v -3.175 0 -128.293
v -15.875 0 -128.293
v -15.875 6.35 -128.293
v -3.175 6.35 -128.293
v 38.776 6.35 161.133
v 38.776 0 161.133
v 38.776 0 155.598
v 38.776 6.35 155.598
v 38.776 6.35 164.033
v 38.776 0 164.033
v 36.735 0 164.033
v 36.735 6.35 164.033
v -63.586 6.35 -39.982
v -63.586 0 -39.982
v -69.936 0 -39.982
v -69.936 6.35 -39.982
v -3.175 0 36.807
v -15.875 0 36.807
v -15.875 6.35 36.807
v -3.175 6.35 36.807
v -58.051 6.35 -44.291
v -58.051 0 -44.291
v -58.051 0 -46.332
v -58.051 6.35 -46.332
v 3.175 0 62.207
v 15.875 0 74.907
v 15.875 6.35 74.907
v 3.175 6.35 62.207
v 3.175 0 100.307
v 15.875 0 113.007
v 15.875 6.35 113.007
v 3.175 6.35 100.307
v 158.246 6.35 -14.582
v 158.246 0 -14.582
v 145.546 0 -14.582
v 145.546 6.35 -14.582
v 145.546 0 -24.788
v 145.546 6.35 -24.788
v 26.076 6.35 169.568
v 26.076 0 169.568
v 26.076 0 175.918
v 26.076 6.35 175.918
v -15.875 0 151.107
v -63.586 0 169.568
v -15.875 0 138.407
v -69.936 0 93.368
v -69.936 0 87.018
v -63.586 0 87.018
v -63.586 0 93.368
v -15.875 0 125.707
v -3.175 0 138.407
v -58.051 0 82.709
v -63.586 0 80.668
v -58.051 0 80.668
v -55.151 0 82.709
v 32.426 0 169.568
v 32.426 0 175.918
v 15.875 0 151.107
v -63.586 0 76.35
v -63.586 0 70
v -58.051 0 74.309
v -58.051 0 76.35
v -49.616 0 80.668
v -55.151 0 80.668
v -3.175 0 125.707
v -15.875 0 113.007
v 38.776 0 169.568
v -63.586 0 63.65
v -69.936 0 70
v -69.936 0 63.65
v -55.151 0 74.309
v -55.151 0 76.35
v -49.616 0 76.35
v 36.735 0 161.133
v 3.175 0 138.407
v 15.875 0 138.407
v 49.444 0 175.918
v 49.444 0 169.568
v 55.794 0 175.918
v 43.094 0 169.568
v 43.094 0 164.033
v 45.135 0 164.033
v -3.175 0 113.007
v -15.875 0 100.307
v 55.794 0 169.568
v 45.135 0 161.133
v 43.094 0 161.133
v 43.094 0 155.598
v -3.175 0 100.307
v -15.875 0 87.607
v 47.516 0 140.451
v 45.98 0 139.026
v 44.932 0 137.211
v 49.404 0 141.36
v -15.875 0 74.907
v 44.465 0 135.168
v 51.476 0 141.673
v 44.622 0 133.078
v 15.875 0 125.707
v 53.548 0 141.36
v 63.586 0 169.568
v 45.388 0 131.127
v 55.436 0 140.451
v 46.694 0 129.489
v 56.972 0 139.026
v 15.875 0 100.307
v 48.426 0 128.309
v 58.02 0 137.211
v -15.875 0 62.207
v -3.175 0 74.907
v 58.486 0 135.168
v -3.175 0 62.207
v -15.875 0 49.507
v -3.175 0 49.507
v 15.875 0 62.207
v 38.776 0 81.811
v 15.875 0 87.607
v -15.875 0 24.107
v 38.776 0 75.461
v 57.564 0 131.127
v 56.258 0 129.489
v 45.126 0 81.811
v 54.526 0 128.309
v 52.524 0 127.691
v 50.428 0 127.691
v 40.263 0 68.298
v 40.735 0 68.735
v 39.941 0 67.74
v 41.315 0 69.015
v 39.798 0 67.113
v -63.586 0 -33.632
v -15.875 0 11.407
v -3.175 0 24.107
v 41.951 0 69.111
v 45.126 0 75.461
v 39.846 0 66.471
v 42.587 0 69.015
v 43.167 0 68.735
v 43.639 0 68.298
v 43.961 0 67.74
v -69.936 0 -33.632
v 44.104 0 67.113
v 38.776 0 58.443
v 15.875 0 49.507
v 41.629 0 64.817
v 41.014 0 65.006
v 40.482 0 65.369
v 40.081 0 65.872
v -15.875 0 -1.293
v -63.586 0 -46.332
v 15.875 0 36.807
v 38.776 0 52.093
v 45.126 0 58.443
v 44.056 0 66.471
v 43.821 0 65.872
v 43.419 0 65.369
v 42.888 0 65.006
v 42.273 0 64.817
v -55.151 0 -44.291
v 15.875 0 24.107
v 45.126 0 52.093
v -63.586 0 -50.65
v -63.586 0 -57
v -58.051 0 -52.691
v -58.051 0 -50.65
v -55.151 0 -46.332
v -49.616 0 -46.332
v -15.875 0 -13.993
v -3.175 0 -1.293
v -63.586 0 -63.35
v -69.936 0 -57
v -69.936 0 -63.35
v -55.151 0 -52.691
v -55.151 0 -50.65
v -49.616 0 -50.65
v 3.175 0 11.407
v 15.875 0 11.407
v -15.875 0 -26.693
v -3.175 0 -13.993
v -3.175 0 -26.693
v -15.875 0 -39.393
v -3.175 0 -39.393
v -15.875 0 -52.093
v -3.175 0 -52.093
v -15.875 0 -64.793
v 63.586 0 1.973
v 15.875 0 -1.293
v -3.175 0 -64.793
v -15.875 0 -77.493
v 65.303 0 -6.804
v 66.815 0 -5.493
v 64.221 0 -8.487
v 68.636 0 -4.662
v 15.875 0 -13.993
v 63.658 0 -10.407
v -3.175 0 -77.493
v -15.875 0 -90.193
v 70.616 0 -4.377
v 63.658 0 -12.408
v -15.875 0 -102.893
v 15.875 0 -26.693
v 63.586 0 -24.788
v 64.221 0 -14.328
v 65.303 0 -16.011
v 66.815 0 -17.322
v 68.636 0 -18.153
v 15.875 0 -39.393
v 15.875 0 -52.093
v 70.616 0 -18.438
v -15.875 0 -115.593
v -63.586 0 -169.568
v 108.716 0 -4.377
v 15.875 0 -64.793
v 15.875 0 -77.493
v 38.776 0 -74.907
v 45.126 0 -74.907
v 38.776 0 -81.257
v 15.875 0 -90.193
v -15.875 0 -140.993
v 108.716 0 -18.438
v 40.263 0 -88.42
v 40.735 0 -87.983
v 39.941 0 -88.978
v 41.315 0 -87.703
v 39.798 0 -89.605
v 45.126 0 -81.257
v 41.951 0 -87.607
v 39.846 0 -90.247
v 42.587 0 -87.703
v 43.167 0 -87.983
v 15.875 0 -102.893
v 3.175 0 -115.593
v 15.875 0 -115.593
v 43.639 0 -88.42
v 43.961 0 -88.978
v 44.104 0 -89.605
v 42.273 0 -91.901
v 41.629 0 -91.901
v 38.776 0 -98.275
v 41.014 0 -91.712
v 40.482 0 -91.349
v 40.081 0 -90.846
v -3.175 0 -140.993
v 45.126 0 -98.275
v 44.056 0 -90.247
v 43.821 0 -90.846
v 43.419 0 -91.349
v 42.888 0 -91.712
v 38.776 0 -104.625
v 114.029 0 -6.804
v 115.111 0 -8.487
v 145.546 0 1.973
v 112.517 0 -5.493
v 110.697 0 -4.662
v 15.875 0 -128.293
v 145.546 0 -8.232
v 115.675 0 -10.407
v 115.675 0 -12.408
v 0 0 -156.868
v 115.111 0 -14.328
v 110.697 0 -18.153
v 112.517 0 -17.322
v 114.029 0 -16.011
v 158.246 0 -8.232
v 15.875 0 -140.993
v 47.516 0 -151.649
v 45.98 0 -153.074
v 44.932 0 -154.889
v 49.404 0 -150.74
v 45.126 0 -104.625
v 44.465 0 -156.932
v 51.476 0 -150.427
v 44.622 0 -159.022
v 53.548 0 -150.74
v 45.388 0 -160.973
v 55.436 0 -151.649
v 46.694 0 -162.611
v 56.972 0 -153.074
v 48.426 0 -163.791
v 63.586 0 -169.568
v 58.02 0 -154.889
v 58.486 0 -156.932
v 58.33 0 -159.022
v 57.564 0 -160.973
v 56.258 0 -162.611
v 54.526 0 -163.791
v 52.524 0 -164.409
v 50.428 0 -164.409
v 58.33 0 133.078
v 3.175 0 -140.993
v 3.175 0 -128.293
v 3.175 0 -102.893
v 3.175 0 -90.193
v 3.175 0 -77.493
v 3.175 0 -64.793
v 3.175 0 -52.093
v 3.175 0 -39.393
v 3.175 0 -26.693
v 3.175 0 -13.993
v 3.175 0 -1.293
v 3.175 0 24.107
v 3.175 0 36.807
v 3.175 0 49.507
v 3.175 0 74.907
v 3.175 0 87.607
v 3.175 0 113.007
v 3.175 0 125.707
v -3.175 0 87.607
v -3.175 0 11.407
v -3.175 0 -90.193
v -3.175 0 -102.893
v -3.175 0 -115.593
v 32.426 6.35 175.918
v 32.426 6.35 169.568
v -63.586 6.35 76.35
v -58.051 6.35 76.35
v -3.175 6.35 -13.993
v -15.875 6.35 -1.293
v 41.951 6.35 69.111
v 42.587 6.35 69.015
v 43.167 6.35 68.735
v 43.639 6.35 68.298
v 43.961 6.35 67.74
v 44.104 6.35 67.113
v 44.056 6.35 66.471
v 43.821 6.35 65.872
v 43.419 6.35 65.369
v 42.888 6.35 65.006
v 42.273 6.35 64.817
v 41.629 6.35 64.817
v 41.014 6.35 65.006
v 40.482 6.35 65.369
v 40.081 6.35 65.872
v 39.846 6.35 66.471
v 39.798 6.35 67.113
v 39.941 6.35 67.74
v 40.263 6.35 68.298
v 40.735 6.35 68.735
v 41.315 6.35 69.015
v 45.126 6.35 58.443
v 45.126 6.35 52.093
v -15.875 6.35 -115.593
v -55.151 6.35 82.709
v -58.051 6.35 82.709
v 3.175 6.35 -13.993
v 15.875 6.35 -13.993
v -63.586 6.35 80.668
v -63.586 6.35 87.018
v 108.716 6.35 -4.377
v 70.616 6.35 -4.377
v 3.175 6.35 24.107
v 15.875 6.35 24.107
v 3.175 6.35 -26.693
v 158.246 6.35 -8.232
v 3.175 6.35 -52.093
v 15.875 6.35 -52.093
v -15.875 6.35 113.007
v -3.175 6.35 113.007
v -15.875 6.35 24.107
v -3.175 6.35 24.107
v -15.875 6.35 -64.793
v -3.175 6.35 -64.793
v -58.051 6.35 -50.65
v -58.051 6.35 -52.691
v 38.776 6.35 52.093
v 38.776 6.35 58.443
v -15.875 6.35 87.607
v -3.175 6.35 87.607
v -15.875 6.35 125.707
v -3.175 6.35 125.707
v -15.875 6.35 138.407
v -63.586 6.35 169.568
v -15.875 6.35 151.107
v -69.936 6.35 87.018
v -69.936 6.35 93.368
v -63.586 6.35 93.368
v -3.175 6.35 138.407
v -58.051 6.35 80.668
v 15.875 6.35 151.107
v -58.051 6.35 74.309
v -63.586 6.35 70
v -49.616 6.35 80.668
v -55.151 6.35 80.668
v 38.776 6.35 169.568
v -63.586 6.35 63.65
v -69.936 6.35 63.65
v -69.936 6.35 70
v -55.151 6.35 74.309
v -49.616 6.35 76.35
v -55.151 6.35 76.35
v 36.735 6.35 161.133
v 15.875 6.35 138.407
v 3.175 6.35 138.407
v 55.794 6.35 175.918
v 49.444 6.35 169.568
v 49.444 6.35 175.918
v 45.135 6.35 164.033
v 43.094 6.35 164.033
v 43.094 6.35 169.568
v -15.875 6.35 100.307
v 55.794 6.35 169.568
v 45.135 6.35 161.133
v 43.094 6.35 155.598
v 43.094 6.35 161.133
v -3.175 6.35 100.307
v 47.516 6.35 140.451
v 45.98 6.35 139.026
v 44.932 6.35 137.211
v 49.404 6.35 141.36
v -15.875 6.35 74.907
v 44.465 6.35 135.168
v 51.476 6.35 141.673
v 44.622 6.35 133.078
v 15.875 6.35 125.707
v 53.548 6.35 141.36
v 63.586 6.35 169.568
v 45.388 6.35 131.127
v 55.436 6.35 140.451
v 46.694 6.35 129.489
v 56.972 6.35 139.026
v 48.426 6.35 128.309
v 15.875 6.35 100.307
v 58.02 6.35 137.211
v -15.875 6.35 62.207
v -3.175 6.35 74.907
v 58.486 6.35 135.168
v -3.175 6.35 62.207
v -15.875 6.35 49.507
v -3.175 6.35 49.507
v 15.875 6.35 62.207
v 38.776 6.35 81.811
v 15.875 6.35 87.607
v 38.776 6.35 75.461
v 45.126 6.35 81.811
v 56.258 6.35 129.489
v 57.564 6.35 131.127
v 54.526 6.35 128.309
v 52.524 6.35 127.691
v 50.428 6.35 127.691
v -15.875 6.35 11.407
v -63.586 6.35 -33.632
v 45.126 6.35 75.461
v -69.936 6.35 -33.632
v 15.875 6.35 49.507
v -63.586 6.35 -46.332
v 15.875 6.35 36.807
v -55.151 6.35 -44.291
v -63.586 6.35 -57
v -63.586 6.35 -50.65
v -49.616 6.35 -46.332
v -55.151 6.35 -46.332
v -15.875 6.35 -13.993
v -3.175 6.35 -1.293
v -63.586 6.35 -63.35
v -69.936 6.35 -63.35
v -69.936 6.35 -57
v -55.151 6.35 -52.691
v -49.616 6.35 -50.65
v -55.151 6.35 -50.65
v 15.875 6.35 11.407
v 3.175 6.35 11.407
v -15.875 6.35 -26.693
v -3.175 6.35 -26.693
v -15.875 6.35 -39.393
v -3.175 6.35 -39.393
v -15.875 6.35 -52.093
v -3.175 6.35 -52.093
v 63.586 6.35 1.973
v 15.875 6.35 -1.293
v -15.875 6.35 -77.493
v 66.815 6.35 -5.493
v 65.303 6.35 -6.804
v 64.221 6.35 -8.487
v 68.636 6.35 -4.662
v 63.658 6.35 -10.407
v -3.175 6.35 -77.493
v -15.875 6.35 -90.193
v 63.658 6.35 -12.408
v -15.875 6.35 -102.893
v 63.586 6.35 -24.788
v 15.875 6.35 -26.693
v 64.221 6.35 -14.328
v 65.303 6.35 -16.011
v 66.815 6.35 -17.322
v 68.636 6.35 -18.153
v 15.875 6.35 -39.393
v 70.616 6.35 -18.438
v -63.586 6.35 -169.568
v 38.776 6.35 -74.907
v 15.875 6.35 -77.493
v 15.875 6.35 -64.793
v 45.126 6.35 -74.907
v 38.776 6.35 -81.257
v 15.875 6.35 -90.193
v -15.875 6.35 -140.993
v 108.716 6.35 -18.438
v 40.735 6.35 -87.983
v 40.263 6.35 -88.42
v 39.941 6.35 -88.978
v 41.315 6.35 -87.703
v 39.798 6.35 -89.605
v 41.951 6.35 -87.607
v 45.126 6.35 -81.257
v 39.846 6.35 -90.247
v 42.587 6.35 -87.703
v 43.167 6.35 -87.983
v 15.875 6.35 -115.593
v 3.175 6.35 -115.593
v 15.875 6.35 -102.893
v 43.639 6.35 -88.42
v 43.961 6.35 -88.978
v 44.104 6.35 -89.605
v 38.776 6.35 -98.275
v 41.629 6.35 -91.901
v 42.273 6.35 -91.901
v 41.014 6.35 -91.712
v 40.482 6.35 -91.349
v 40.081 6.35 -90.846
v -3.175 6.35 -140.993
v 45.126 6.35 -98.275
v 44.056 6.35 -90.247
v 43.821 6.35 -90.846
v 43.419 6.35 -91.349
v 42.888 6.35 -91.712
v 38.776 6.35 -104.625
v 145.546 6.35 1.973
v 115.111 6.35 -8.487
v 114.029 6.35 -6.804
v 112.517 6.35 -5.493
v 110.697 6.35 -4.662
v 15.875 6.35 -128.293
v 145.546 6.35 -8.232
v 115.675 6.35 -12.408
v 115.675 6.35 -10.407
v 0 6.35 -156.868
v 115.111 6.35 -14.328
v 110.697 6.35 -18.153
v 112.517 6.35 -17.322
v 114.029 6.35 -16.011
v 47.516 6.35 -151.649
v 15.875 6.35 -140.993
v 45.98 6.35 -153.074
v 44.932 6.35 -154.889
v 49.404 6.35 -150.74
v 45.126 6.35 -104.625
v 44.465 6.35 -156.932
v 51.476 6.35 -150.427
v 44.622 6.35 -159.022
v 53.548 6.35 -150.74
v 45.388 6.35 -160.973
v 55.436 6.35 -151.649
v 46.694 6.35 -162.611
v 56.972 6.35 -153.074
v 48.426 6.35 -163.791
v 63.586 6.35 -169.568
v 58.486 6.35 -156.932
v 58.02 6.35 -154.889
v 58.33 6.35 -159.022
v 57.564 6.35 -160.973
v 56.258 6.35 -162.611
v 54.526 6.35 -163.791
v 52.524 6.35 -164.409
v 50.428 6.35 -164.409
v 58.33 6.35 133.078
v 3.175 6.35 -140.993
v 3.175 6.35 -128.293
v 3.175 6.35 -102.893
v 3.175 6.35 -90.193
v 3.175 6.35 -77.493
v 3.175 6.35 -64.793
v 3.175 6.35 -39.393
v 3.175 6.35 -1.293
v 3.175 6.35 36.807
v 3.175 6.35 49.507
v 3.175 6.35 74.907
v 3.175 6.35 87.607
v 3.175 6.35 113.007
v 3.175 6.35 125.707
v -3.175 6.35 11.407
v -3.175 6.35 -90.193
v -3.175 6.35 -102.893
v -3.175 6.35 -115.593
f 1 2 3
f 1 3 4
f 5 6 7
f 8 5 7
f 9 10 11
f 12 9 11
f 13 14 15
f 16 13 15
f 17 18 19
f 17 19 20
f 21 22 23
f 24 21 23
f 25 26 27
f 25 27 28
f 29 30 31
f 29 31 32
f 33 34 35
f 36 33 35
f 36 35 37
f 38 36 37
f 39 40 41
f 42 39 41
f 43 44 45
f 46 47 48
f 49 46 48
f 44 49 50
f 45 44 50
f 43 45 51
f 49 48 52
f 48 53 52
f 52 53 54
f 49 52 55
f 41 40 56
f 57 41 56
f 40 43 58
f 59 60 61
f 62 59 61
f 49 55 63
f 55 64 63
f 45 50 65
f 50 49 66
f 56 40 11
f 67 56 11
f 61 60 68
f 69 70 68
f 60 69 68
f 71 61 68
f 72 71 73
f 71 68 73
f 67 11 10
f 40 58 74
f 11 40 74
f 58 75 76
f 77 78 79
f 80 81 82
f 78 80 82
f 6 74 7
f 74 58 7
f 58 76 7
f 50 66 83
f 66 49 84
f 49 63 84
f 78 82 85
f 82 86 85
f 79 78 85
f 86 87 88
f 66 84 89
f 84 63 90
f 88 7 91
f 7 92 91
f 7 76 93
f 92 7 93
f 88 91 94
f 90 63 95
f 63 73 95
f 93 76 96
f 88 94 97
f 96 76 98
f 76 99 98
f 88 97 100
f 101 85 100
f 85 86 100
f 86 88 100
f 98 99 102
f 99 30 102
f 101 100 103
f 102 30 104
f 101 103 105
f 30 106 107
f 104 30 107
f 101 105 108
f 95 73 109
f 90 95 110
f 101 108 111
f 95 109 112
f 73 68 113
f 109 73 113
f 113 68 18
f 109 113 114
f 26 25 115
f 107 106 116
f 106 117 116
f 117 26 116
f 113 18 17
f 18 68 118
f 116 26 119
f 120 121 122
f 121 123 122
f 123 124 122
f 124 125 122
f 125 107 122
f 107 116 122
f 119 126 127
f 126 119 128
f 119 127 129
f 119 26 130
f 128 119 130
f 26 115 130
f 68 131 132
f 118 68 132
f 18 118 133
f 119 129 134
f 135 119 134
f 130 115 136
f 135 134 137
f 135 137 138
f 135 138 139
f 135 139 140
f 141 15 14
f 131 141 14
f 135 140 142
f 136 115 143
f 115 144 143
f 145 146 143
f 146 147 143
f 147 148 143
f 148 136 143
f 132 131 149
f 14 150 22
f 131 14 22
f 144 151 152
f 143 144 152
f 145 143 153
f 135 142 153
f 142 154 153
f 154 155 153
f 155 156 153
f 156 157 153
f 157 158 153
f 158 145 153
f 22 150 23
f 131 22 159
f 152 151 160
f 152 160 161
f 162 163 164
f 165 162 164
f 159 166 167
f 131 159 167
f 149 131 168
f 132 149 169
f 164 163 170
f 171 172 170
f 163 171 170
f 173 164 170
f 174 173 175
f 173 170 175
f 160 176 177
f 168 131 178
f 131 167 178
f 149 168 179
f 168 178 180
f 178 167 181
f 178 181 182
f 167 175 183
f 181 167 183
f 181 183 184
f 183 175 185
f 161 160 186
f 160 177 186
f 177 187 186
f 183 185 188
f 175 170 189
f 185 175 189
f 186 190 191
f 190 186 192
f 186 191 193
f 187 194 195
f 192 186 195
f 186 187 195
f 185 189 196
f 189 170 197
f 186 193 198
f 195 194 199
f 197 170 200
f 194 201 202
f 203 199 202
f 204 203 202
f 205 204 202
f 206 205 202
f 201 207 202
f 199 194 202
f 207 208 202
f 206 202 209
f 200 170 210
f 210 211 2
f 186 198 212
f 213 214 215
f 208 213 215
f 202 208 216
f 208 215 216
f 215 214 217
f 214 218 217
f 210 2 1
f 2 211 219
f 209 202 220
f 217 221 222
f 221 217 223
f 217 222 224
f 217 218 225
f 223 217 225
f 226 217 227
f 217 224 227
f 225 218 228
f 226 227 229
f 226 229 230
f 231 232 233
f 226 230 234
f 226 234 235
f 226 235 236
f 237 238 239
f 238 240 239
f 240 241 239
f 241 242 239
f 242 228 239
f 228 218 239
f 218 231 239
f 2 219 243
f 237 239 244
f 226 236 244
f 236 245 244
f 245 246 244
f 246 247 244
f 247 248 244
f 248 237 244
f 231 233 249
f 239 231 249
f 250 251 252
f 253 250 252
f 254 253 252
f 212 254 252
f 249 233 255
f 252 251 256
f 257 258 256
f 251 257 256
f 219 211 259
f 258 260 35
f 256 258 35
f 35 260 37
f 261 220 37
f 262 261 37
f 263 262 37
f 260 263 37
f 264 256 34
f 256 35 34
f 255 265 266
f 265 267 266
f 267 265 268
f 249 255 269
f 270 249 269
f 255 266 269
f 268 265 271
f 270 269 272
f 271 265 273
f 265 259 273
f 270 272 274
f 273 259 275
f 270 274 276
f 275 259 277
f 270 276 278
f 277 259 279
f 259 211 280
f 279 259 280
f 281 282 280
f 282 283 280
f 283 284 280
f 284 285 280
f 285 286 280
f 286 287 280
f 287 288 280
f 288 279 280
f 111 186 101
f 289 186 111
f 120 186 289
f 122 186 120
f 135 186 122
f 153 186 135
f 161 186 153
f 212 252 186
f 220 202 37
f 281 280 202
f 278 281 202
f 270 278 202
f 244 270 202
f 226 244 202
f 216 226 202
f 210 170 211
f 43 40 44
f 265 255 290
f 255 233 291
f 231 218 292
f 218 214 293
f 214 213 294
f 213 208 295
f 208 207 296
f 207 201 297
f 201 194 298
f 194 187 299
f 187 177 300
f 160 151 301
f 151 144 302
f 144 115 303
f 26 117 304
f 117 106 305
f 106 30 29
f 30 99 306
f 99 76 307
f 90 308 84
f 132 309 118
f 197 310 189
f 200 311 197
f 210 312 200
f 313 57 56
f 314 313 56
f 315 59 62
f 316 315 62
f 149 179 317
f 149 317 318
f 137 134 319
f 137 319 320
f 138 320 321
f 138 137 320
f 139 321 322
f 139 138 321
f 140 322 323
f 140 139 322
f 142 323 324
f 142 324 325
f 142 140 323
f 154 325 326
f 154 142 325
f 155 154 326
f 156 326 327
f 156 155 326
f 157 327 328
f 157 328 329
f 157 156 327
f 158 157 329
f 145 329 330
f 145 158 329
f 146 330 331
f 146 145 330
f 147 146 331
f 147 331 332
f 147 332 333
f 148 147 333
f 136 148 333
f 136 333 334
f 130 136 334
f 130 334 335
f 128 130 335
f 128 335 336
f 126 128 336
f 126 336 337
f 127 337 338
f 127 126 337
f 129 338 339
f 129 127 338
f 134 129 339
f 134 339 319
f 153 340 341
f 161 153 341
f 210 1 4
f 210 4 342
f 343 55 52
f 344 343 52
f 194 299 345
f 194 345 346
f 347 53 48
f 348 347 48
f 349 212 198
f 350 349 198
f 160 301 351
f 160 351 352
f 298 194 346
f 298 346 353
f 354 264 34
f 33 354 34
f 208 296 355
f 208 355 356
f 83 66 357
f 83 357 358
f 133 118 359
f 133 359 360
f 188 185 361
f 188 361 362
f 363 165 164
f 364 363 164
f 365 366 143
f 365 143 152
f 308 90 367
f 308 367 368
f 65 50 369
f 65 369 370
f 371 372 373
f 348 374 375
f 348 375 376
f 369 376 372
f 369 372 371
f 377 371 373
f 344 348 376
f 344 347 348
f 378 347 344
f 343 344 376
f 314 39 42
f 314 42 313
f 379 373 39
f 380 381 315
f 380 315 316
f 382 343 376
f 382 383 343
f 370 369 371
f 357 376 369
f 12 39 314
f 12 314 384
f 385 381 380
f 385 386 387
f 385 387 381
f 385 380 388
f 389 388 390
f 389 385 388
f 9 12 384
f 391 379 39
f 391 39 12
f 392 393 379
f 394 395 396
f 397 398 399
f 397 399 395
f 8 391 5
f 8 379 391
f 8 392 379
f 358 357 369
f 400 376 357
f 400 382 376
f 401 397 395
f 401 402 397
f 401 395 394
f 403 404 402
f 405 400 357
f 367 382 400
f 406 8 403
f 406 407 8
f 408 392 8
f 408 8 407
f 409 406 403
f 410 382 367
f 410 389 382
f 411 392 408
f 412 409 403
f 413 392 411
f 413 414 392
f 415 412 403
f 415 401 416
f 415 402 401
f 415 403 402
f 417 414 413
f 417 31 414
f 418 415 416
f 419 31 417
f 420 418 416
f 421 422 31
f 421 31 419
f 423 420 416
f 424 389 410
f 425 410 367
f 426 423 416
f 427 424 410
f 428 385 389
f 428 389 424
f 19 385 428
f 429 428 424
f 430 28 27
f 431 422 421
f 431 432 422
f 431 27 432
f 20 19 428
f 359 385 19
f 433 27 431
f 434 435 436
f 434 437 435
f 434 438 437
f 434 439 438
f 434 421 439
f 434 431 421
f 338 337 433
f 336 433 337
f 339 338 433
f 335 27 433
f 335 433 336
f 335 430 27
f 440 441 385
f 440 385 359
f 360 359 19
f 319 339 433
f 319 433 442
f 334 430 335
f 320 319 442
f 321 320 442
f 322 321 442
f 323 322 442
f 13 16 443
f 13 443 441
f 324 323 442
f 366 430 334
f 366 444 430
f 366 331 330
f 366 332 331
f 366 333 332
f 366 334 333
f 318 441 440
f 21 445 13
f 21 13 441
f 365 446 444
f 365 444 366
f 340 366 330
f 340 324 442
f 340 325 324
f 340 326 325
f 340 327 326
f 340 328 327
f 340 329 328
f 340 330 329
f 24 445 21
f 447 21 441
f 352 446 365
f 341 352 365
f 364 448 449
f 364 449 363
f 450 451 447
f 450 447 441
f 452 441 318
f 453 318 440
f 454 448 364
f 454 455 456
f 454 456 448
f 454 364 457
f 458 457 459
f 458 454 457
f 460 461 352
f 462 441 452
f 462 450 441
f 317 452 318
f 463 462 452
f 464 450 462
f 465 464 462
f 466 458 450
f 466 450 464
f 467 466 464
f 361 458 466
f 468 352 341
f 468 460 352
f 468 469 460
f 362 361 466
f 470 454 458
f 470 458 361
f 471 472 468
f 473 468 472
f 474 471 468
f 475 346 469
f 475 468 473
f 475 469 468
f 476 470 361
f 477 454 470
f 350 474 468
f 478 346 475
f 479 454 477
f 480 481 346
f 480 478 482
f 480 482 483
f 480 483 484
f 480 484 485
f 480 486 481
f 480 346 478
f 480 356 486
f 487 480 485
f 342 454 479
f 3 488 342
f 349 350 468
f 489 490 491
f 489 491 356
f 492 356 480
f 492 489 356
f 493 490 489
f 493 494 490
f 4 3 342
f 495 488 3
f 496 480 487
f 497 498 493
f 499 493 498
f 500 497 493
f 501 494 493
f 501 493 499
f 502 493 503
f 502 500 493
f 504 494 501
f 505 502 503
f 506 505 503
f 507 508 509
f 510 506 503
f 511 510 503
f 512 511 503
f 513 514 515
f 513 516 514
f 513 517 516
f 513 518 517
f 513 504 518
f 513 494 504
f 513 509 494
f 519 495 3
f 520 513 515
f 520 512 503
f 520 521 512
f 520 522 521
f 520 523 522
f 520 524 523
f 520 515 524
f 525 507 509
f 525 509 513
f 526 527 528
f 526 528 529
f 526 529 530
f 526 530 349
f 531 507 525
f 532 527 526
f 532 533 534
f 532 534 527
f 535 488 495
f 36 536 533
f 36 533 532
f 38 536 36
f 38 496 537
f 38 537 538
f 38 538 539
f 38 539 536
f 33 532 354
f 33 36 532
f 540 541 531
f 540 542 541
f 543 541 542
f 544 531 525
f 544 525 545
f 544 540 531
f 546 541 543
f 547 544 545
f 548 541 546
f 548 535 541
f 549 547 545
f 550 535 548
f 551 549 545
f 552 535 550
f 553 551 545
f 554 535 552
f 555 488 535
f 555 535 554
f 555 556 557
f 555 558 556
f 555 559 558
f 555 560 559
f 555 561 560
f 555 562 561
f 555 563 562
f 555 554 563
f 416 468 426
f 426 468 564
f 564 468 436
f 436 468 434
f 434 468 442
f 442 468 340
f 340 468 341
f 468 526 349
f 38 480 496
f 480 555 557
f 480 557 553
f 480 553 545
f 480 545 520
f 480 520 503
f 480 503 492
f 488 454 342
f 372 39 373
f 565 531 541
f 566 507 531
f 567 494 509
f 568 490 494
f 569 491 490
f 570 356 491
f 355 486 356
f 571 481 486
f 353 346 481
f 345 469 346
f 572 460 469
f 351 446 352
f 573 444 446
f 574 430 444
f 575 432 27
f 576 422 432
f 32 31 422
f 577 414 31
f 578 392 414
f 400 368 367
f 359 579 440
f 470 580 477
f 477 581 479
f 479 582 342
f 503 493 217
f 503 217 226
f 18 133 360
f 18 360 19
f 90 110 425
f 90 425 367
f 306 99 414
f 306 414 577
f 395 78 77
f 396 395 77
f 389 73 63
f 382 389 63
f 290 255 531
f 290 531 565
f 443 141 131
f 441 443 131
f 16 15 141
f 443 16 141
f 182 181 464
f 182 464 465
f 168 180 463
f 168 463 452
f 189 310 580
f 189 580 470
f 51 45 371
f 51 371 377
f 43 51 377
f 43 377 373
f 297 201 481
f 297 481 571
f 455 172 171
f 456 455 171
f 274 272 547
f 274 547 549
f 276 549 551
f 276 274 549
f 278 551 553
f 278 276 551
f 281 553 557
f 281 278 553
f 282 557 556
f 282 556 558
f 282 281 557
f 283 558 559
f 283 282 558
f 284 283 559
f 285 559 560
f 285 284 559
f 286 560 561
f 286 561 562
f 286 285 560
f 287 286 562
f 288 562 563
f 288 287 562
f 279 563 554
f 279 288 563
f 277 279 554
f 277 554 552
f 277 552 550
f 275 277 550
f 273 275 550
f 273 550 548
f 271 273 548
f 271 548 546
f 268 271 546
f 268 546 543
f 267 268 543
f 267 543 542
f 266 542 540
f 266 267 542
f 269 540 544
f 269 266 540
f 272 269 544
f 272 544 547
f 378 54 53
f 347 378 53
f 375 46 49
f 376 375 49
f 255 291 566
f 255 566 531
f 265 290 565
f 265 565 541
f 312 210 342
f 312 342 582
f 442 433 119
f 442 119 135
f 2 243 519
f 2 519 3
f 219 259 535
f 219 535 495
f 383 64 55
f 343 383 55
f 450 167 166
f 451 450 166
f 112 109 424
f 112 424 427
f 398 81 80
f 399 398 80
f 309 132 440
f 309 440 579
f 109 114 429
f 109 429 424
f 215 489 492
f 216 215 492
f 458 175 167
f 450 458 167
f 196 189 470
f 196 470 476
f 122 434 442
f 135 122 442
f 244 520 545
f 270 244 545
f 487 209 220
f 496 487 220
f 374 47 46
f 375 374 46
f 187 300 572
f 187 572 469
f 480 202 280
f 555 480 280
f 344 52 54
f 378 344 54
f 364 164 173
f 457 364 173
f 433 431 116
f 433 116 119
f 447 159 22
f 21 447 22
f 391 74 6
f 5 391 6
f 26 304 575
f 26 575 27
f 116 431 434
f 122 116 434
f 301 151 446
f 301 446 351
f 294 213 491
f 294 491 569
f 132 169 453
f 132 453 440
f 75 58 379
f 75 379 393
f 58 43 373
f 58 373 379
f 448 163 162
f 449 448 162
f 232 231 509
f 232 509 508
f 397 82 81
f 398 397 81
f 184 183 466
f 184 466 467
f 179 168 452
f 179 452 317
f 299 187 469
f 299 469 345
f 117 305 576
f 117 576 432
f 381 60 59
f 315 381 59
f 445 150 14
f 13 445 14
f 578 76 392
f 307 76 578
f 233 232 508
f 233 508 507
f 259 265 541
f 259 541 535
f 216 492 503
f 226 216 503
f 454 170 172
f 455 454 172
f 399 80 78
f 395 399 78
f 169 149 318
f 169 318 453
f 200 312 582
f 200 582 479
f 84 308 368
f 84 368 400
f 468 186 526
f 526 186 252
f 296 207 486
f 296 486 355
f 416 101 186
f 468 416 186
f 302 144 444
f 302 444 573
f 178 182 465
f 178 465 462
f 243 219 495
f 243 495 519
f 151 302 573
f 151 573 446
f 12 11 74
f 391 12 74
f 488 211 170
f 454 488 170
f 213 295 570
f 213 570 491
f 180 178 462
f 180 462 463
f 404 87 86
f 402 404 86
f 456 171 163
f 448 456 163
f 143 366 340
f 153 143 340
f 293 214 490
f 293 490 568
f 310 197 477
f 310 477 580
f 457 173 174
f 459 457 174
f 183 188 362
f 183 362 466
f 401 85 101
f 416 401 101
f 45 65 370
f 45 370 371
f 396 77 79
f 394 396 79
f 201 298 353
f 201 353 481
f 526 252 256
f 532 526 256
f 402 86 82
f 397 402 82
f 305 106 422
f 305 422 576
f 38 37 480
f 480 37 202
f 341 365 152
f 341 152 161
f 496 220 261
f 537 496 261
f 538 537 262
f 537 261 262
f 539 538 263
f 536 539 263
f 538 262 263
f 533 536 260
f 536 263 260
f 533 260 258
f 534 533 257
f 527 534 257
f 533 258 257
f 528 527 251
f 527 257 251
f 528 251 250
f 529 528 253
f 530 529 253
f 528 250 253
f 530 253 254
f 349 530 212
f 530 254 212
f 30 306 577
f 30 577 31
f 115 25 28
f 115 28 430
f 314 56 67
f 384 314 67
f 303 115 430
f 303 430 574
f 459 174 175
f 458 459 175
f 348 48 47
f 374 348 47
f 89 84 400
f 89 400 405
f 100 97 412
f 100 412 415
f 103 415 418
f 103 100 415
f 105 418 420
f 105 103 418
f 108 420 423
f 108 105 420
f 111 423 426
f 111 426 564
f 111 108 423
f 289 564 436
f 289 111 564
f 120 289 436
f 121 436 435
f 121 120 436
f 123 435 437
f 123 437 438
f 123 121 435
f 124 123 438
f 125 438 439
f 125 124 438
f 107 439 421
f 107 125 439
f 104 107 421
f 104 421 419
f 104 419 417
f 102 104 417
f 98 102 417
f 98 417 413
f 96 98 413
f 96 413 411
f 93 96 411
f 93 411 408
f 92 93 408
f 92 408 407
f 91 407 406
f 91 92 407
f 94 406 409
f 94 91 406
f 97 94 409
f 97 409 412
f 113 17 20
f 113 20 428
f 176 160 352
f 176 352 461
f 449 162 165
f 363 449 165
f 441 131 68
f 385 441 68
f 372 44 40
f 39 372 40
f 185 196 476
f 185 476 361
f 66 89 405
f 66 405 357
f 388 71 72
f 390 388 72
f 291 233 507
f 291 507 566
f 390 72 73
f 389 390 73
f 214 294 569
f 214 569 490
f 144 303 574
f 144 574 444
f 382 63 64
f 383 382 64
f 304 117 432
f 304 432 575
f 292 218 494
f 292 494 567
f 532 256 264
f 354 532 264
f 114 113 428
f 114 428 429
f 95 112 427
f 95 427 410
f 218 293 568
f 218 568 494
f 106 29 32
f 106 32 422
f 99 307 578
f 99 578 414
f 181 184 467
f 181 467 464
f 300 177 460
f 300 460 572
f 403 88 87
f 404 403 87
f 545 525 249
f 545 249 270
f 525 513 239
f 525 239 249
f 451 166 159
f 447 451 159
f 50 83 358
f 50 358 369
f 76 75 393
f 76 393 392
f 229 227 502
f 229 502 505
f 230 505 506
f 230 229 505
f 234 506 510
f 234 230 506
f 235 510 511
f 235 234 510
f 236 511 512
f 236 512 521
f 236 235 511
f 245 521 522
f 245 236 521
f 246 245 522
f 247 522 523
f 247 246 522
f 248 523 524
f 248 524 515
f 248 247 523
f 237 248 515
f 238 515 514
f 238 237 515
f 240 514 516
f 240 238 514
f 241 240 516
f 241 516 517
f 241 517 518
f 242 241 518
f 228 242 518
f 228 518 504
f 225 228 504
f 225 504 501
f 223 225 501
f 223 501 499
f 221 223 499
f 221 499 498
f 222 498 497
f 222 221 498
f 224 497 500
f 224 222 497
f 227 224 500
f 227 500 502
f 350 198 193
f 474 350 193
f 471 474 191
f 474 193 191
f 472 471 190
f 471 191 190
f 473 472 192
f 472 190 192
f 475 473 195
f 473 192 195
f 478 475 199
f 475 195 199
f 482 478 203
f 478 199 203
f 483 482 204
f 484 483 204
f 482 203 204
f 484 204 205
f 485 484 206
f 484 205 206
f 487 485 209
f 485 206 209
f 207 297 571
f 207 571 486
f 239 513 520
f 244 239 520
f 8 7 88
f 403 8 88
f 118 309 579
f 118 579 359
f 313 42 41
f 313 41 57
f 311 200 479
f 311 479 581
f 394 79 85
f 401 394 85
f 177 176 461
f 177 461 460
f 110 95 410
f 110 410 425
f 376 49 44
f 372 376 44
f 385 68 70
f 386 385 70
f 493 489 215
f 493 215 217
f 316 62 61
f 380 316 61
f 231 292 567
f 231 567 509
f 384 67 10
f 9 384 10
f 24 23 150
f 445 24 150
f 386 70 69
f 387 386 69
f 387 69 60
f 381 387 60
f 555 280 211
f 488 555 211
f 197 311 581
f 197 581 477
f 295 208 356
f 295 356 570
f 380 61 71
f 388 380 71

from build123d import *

# Parameters (mm, degrees)
AXLE_SUPPORT_PLATE_R   = 7.030128061
AXLE_SUPPORT_PLATE_R_2 = 2.159
AXLE_SUPPORT_PLATE_W   = 6.35
AXLE_SUPPORT_PLATE_H   = 6.35
BOSS_EXTRUDE1_DEPTH    = 6.35


with BuildPart() as part:
    # Axle Support Plate → Boss-Extrude1 (new body)
    with BuildSketch(Plane(origin=(0, 0, 0), x_dir=(1, 0, 0), z_dir=(0, 1, 0))):
        Polygon((63.58606403, -169.56756403), (63.58606403, -1.972692091), (145.546192091, -1.972692091), (145.546192091, 8.23243597), (158.246192091, 8.23243597), (158.246192091, 14.58243597), (145.546192091, 14.58243597), (145.546192091, 24.78756403), (63.58606403, 24.78756403), (63.58606403, 169.56756403), (-63.58606403, 169.56756403), (-63.58606403, 63.35043597), (-69.93606403, 63.35043597), (-69.93606403, 57.00043597), (-63.58606403, 57.00043597), (-63.58606403, 50.65043597), (-58.051064051, 50.65043597), (-58.051064051, 52.691435952), (-55.151064009, 52.691435952), (-55.151064009, 50.65043597), (-49.61606403, 50.65043597), (-49.61606403, 46.33243597), (-55.151064009, 46.33243597), (-55.151064009, 44.291435988), (-58.051064051, 44.291435988), (-58.051064051, 46.33243597), (-63.58606403, 46.33243597), (-63.58606403, 39.98243597), (-69.93606403, 39.98243597), (-69.93606403, 33.63243597), (-63.58606403, 33.63243597), (-63.58606403, -63.64956403), (-69.93606403, -63.64956403), (-69.93606403, -69.99956403), (-63.58606403, -69.99956403), (-63.58606403, -76.34956403), (-58.051064051, -76.34956403), (-58.051064051, -74.308564048), (-55.151064009, -74.308564048), (-55.151064009, -76.34956403), (-49.61606403, -76.34956403), (-49.61606403, -80.66756403), (-55.151064009, -80.66756403), (-55.151064009, -82.708564012), (-58.051064051, -82.708564012), (-58.051064051, -80.66756403), (-63.58606403, -80.66756403), (-63.58606403, -87.01756403), (-69.93606403, -87.01756403), (-69.93606403, -93.36756403), (-63.58606403, -93.36756403), (-63.58606403, -169.56756403), (26.07593597, -169.56756403), (26.07593597, -175.91756403), (32.42593597, -175.91756403), (32.42593597, -169.56756403), (38.77593597, -169.56756403), (38.77593597, -164.032564051), (36.734935988, -164.032564051), (36.734935988, -161.132564009), (38.77593597, -161.132564009), (38.77593597, -155.59756403), (43.09393597, -155.59756403), (43.09393597, -161.132564009), (45.134935952, -161.132564009), (45.134935952, -164.032564051), (43.09393597, -164.032564051), (43.09393597, -169.56756403), (49.44393597, -169.56756403), (49.44393597, -175.91756403), (55.79393597, -175.91756403), (55.79393597, -169.56756403), align=None)
        with Locations(Location((51.47593597, 157.45743597, 0), (0, 0, 270))):
            Circle(AXLE_SUPPORT_PLATE_R, mode=Mode.SUBTRACT)
        with Locations(Location((51.47593597, -134.64256403, 0), (0, 0, 270))):
            Circle(AXLE_SUPPORT_PLATE_R, mode=Mode.SUBTRACT)
        with Locations(Location((41.95093597, 89.76643597, 0), (0, 0, 270))):
            Circle(AXLE_SUPPORT_PLATE_R_2, mode=Mode.SUBTRACT)
        with Locations(Location((41.95093597, -66.95156403, 0), (0, 0, 270))):
            Circle(AXLE_SUPPORT_PLATE_R_2, mode=Mode.SUBTRACT)
        Polygon((0, 156.86756403), (-15.875, 140.99256403), (-3.175, 140.99256403), (-15.875, 128.29256403), (-3.175, 128.29256403), (-15.875, 115.59256403), (-3.175, 115.59256403), (-15.875, 102.89256403), (-3.175, 102.89256403), (-15.875, 90.19256403), (-3.175, 90.19256403), (-15.875, 77.49256403), (-3.175, 77.49256403), (-15.875, 64.79256403), (-3.175, 64.79256403), (-15.875, 52.09256403), (-3.175, 52.09256403), (-15.875, 39.39256403), (-3.175, 39.39256403), (-15.875, 26.69256403), (-3.175, 26.69256403), (-15.875, 13.99256403), (-3.175, 13.99256403), (-15.875, 1.29256403), (-3.175, 1.29256403), (-15.875, -11.40743597), (-3.175, -11.40743597), (-15.875, -24.10743597), (-3.175, -24.10743597), (-15.875, -36.80743597), (-3.175, -36.80743597), (-15.875, -49.50743597), (-3.175, -49.50743597), (-15.875, -62.20743597), (-3.175, -62.20743597), (-15.875, -74.90743597), (-3.175, -74.90743597), (-15.875, -87.60743597), (-3.175, -87.60743597), (-15.875, -100.30743597), (-3.175, -100.30743597), (-15.875, -113.00743597), (-3.175, -113.00743597), (-15.875, -125.70743597), (-3.175, -125.70743597), (-15.875, -138.40743597), (-3.175, -138.40743597), (-15.875, -151.10743597), (15.875, -151.10743597), (3.175, -138.40743597), (15.875, -138.40743597), (3.175, -125.70743597), (15.875, -125.70743597), (3.175, -113.00743597), (15.875, -113.00743597), (3.175, -100.30743597), (15.875, -100.30743597), (3.175, -87.60743597), (15.875, -87.60743597), (3.175, -74.90743597), (15.875, -74.90743597), (3.175, -62.20743597), (15.875, -62.20743597), (3.175, -49.50743597), (15.875, -49.50743597), (3.175, -36.80743597), (15.875, -36.80743597), (3.175, -24.10743597), (15.875, -24.10743597), (3.175, -11.40743597), (15.875, -11.40743597), (3.175, 1.29256403), (15.875, 1.29256403), (3.175, 13.99256403), (15.875, 13.99256403), (3.175, 26.69256403), (15.875, 26.69256403), (3.175, 39.39256403), (15.875, 39.39256403), (3.175, 52.09256403), (15.875, 52.09256403), (3.175, 64.79256403), (15.875, 64.79256403), (3.175, 77.49256403), (15.875, 77.49256403), (3.175, 90.19256403), (15.875, 90.19256403), (3.175, 102.89256403), (15.875, 102.89256403), (3.175, 115.59256403), (15.875, 115.59256403), (3.175, 128.29256403), (15.875, 128.29256403), (3.175, 140.99256403), (15.875, 140.99256403), align=None, mode=Mode.SUBTRACT)
        with BuildLine():
            Line((70.616192091, 18.43756403), (108.716192091, 18.43756403))
            ThreePointArc((108.716192091, 18.43756403), (115.746320151, 11.40743597), (108.716192091, 4.377307909))
            Line((108.716192091, 4.377307909), (70.616192091, 4.377307909))
            ThreePointArc((70.616192091, 4.377307909), (63.58606403, 11.40743597), (70.616192091, 18.43756403))
        make_face(mode=Mode.SUBTRACT)
        with Locations((41.95093597, 101.45043597)):
            Rectangle(AXLE_SUPPORT_PLATE_W, AXLE_SUPPORT_PLATE_H, mode=Mode.SUBTRACT)
        with Locations((41.95093597, 78.08243597)):
            Rectangle(AXLE_SUPPORT_PLATE_W, AXLE_SUPPORT_PLATE_H, mode=Mode.SUBTRACT)
        with Locations((41.95093597, -78.63556403)):
            Rectangle(AXLE_SUPPORT_PLATE_W, AXLE_SUPPORT_PLATE_H, mode=Mode.SUBTRACT)
        with Locations((41.95093597, -55.26756403)):
            Rectangle(AXLE_SUPPORT_PLATE_W, AXLE_SUPPORT_PLATE_H, mode=Mode.SUBTRACT)
    extrude(amount=BOSS_EXTRUDE1_DEPTH)


solid = part.part
